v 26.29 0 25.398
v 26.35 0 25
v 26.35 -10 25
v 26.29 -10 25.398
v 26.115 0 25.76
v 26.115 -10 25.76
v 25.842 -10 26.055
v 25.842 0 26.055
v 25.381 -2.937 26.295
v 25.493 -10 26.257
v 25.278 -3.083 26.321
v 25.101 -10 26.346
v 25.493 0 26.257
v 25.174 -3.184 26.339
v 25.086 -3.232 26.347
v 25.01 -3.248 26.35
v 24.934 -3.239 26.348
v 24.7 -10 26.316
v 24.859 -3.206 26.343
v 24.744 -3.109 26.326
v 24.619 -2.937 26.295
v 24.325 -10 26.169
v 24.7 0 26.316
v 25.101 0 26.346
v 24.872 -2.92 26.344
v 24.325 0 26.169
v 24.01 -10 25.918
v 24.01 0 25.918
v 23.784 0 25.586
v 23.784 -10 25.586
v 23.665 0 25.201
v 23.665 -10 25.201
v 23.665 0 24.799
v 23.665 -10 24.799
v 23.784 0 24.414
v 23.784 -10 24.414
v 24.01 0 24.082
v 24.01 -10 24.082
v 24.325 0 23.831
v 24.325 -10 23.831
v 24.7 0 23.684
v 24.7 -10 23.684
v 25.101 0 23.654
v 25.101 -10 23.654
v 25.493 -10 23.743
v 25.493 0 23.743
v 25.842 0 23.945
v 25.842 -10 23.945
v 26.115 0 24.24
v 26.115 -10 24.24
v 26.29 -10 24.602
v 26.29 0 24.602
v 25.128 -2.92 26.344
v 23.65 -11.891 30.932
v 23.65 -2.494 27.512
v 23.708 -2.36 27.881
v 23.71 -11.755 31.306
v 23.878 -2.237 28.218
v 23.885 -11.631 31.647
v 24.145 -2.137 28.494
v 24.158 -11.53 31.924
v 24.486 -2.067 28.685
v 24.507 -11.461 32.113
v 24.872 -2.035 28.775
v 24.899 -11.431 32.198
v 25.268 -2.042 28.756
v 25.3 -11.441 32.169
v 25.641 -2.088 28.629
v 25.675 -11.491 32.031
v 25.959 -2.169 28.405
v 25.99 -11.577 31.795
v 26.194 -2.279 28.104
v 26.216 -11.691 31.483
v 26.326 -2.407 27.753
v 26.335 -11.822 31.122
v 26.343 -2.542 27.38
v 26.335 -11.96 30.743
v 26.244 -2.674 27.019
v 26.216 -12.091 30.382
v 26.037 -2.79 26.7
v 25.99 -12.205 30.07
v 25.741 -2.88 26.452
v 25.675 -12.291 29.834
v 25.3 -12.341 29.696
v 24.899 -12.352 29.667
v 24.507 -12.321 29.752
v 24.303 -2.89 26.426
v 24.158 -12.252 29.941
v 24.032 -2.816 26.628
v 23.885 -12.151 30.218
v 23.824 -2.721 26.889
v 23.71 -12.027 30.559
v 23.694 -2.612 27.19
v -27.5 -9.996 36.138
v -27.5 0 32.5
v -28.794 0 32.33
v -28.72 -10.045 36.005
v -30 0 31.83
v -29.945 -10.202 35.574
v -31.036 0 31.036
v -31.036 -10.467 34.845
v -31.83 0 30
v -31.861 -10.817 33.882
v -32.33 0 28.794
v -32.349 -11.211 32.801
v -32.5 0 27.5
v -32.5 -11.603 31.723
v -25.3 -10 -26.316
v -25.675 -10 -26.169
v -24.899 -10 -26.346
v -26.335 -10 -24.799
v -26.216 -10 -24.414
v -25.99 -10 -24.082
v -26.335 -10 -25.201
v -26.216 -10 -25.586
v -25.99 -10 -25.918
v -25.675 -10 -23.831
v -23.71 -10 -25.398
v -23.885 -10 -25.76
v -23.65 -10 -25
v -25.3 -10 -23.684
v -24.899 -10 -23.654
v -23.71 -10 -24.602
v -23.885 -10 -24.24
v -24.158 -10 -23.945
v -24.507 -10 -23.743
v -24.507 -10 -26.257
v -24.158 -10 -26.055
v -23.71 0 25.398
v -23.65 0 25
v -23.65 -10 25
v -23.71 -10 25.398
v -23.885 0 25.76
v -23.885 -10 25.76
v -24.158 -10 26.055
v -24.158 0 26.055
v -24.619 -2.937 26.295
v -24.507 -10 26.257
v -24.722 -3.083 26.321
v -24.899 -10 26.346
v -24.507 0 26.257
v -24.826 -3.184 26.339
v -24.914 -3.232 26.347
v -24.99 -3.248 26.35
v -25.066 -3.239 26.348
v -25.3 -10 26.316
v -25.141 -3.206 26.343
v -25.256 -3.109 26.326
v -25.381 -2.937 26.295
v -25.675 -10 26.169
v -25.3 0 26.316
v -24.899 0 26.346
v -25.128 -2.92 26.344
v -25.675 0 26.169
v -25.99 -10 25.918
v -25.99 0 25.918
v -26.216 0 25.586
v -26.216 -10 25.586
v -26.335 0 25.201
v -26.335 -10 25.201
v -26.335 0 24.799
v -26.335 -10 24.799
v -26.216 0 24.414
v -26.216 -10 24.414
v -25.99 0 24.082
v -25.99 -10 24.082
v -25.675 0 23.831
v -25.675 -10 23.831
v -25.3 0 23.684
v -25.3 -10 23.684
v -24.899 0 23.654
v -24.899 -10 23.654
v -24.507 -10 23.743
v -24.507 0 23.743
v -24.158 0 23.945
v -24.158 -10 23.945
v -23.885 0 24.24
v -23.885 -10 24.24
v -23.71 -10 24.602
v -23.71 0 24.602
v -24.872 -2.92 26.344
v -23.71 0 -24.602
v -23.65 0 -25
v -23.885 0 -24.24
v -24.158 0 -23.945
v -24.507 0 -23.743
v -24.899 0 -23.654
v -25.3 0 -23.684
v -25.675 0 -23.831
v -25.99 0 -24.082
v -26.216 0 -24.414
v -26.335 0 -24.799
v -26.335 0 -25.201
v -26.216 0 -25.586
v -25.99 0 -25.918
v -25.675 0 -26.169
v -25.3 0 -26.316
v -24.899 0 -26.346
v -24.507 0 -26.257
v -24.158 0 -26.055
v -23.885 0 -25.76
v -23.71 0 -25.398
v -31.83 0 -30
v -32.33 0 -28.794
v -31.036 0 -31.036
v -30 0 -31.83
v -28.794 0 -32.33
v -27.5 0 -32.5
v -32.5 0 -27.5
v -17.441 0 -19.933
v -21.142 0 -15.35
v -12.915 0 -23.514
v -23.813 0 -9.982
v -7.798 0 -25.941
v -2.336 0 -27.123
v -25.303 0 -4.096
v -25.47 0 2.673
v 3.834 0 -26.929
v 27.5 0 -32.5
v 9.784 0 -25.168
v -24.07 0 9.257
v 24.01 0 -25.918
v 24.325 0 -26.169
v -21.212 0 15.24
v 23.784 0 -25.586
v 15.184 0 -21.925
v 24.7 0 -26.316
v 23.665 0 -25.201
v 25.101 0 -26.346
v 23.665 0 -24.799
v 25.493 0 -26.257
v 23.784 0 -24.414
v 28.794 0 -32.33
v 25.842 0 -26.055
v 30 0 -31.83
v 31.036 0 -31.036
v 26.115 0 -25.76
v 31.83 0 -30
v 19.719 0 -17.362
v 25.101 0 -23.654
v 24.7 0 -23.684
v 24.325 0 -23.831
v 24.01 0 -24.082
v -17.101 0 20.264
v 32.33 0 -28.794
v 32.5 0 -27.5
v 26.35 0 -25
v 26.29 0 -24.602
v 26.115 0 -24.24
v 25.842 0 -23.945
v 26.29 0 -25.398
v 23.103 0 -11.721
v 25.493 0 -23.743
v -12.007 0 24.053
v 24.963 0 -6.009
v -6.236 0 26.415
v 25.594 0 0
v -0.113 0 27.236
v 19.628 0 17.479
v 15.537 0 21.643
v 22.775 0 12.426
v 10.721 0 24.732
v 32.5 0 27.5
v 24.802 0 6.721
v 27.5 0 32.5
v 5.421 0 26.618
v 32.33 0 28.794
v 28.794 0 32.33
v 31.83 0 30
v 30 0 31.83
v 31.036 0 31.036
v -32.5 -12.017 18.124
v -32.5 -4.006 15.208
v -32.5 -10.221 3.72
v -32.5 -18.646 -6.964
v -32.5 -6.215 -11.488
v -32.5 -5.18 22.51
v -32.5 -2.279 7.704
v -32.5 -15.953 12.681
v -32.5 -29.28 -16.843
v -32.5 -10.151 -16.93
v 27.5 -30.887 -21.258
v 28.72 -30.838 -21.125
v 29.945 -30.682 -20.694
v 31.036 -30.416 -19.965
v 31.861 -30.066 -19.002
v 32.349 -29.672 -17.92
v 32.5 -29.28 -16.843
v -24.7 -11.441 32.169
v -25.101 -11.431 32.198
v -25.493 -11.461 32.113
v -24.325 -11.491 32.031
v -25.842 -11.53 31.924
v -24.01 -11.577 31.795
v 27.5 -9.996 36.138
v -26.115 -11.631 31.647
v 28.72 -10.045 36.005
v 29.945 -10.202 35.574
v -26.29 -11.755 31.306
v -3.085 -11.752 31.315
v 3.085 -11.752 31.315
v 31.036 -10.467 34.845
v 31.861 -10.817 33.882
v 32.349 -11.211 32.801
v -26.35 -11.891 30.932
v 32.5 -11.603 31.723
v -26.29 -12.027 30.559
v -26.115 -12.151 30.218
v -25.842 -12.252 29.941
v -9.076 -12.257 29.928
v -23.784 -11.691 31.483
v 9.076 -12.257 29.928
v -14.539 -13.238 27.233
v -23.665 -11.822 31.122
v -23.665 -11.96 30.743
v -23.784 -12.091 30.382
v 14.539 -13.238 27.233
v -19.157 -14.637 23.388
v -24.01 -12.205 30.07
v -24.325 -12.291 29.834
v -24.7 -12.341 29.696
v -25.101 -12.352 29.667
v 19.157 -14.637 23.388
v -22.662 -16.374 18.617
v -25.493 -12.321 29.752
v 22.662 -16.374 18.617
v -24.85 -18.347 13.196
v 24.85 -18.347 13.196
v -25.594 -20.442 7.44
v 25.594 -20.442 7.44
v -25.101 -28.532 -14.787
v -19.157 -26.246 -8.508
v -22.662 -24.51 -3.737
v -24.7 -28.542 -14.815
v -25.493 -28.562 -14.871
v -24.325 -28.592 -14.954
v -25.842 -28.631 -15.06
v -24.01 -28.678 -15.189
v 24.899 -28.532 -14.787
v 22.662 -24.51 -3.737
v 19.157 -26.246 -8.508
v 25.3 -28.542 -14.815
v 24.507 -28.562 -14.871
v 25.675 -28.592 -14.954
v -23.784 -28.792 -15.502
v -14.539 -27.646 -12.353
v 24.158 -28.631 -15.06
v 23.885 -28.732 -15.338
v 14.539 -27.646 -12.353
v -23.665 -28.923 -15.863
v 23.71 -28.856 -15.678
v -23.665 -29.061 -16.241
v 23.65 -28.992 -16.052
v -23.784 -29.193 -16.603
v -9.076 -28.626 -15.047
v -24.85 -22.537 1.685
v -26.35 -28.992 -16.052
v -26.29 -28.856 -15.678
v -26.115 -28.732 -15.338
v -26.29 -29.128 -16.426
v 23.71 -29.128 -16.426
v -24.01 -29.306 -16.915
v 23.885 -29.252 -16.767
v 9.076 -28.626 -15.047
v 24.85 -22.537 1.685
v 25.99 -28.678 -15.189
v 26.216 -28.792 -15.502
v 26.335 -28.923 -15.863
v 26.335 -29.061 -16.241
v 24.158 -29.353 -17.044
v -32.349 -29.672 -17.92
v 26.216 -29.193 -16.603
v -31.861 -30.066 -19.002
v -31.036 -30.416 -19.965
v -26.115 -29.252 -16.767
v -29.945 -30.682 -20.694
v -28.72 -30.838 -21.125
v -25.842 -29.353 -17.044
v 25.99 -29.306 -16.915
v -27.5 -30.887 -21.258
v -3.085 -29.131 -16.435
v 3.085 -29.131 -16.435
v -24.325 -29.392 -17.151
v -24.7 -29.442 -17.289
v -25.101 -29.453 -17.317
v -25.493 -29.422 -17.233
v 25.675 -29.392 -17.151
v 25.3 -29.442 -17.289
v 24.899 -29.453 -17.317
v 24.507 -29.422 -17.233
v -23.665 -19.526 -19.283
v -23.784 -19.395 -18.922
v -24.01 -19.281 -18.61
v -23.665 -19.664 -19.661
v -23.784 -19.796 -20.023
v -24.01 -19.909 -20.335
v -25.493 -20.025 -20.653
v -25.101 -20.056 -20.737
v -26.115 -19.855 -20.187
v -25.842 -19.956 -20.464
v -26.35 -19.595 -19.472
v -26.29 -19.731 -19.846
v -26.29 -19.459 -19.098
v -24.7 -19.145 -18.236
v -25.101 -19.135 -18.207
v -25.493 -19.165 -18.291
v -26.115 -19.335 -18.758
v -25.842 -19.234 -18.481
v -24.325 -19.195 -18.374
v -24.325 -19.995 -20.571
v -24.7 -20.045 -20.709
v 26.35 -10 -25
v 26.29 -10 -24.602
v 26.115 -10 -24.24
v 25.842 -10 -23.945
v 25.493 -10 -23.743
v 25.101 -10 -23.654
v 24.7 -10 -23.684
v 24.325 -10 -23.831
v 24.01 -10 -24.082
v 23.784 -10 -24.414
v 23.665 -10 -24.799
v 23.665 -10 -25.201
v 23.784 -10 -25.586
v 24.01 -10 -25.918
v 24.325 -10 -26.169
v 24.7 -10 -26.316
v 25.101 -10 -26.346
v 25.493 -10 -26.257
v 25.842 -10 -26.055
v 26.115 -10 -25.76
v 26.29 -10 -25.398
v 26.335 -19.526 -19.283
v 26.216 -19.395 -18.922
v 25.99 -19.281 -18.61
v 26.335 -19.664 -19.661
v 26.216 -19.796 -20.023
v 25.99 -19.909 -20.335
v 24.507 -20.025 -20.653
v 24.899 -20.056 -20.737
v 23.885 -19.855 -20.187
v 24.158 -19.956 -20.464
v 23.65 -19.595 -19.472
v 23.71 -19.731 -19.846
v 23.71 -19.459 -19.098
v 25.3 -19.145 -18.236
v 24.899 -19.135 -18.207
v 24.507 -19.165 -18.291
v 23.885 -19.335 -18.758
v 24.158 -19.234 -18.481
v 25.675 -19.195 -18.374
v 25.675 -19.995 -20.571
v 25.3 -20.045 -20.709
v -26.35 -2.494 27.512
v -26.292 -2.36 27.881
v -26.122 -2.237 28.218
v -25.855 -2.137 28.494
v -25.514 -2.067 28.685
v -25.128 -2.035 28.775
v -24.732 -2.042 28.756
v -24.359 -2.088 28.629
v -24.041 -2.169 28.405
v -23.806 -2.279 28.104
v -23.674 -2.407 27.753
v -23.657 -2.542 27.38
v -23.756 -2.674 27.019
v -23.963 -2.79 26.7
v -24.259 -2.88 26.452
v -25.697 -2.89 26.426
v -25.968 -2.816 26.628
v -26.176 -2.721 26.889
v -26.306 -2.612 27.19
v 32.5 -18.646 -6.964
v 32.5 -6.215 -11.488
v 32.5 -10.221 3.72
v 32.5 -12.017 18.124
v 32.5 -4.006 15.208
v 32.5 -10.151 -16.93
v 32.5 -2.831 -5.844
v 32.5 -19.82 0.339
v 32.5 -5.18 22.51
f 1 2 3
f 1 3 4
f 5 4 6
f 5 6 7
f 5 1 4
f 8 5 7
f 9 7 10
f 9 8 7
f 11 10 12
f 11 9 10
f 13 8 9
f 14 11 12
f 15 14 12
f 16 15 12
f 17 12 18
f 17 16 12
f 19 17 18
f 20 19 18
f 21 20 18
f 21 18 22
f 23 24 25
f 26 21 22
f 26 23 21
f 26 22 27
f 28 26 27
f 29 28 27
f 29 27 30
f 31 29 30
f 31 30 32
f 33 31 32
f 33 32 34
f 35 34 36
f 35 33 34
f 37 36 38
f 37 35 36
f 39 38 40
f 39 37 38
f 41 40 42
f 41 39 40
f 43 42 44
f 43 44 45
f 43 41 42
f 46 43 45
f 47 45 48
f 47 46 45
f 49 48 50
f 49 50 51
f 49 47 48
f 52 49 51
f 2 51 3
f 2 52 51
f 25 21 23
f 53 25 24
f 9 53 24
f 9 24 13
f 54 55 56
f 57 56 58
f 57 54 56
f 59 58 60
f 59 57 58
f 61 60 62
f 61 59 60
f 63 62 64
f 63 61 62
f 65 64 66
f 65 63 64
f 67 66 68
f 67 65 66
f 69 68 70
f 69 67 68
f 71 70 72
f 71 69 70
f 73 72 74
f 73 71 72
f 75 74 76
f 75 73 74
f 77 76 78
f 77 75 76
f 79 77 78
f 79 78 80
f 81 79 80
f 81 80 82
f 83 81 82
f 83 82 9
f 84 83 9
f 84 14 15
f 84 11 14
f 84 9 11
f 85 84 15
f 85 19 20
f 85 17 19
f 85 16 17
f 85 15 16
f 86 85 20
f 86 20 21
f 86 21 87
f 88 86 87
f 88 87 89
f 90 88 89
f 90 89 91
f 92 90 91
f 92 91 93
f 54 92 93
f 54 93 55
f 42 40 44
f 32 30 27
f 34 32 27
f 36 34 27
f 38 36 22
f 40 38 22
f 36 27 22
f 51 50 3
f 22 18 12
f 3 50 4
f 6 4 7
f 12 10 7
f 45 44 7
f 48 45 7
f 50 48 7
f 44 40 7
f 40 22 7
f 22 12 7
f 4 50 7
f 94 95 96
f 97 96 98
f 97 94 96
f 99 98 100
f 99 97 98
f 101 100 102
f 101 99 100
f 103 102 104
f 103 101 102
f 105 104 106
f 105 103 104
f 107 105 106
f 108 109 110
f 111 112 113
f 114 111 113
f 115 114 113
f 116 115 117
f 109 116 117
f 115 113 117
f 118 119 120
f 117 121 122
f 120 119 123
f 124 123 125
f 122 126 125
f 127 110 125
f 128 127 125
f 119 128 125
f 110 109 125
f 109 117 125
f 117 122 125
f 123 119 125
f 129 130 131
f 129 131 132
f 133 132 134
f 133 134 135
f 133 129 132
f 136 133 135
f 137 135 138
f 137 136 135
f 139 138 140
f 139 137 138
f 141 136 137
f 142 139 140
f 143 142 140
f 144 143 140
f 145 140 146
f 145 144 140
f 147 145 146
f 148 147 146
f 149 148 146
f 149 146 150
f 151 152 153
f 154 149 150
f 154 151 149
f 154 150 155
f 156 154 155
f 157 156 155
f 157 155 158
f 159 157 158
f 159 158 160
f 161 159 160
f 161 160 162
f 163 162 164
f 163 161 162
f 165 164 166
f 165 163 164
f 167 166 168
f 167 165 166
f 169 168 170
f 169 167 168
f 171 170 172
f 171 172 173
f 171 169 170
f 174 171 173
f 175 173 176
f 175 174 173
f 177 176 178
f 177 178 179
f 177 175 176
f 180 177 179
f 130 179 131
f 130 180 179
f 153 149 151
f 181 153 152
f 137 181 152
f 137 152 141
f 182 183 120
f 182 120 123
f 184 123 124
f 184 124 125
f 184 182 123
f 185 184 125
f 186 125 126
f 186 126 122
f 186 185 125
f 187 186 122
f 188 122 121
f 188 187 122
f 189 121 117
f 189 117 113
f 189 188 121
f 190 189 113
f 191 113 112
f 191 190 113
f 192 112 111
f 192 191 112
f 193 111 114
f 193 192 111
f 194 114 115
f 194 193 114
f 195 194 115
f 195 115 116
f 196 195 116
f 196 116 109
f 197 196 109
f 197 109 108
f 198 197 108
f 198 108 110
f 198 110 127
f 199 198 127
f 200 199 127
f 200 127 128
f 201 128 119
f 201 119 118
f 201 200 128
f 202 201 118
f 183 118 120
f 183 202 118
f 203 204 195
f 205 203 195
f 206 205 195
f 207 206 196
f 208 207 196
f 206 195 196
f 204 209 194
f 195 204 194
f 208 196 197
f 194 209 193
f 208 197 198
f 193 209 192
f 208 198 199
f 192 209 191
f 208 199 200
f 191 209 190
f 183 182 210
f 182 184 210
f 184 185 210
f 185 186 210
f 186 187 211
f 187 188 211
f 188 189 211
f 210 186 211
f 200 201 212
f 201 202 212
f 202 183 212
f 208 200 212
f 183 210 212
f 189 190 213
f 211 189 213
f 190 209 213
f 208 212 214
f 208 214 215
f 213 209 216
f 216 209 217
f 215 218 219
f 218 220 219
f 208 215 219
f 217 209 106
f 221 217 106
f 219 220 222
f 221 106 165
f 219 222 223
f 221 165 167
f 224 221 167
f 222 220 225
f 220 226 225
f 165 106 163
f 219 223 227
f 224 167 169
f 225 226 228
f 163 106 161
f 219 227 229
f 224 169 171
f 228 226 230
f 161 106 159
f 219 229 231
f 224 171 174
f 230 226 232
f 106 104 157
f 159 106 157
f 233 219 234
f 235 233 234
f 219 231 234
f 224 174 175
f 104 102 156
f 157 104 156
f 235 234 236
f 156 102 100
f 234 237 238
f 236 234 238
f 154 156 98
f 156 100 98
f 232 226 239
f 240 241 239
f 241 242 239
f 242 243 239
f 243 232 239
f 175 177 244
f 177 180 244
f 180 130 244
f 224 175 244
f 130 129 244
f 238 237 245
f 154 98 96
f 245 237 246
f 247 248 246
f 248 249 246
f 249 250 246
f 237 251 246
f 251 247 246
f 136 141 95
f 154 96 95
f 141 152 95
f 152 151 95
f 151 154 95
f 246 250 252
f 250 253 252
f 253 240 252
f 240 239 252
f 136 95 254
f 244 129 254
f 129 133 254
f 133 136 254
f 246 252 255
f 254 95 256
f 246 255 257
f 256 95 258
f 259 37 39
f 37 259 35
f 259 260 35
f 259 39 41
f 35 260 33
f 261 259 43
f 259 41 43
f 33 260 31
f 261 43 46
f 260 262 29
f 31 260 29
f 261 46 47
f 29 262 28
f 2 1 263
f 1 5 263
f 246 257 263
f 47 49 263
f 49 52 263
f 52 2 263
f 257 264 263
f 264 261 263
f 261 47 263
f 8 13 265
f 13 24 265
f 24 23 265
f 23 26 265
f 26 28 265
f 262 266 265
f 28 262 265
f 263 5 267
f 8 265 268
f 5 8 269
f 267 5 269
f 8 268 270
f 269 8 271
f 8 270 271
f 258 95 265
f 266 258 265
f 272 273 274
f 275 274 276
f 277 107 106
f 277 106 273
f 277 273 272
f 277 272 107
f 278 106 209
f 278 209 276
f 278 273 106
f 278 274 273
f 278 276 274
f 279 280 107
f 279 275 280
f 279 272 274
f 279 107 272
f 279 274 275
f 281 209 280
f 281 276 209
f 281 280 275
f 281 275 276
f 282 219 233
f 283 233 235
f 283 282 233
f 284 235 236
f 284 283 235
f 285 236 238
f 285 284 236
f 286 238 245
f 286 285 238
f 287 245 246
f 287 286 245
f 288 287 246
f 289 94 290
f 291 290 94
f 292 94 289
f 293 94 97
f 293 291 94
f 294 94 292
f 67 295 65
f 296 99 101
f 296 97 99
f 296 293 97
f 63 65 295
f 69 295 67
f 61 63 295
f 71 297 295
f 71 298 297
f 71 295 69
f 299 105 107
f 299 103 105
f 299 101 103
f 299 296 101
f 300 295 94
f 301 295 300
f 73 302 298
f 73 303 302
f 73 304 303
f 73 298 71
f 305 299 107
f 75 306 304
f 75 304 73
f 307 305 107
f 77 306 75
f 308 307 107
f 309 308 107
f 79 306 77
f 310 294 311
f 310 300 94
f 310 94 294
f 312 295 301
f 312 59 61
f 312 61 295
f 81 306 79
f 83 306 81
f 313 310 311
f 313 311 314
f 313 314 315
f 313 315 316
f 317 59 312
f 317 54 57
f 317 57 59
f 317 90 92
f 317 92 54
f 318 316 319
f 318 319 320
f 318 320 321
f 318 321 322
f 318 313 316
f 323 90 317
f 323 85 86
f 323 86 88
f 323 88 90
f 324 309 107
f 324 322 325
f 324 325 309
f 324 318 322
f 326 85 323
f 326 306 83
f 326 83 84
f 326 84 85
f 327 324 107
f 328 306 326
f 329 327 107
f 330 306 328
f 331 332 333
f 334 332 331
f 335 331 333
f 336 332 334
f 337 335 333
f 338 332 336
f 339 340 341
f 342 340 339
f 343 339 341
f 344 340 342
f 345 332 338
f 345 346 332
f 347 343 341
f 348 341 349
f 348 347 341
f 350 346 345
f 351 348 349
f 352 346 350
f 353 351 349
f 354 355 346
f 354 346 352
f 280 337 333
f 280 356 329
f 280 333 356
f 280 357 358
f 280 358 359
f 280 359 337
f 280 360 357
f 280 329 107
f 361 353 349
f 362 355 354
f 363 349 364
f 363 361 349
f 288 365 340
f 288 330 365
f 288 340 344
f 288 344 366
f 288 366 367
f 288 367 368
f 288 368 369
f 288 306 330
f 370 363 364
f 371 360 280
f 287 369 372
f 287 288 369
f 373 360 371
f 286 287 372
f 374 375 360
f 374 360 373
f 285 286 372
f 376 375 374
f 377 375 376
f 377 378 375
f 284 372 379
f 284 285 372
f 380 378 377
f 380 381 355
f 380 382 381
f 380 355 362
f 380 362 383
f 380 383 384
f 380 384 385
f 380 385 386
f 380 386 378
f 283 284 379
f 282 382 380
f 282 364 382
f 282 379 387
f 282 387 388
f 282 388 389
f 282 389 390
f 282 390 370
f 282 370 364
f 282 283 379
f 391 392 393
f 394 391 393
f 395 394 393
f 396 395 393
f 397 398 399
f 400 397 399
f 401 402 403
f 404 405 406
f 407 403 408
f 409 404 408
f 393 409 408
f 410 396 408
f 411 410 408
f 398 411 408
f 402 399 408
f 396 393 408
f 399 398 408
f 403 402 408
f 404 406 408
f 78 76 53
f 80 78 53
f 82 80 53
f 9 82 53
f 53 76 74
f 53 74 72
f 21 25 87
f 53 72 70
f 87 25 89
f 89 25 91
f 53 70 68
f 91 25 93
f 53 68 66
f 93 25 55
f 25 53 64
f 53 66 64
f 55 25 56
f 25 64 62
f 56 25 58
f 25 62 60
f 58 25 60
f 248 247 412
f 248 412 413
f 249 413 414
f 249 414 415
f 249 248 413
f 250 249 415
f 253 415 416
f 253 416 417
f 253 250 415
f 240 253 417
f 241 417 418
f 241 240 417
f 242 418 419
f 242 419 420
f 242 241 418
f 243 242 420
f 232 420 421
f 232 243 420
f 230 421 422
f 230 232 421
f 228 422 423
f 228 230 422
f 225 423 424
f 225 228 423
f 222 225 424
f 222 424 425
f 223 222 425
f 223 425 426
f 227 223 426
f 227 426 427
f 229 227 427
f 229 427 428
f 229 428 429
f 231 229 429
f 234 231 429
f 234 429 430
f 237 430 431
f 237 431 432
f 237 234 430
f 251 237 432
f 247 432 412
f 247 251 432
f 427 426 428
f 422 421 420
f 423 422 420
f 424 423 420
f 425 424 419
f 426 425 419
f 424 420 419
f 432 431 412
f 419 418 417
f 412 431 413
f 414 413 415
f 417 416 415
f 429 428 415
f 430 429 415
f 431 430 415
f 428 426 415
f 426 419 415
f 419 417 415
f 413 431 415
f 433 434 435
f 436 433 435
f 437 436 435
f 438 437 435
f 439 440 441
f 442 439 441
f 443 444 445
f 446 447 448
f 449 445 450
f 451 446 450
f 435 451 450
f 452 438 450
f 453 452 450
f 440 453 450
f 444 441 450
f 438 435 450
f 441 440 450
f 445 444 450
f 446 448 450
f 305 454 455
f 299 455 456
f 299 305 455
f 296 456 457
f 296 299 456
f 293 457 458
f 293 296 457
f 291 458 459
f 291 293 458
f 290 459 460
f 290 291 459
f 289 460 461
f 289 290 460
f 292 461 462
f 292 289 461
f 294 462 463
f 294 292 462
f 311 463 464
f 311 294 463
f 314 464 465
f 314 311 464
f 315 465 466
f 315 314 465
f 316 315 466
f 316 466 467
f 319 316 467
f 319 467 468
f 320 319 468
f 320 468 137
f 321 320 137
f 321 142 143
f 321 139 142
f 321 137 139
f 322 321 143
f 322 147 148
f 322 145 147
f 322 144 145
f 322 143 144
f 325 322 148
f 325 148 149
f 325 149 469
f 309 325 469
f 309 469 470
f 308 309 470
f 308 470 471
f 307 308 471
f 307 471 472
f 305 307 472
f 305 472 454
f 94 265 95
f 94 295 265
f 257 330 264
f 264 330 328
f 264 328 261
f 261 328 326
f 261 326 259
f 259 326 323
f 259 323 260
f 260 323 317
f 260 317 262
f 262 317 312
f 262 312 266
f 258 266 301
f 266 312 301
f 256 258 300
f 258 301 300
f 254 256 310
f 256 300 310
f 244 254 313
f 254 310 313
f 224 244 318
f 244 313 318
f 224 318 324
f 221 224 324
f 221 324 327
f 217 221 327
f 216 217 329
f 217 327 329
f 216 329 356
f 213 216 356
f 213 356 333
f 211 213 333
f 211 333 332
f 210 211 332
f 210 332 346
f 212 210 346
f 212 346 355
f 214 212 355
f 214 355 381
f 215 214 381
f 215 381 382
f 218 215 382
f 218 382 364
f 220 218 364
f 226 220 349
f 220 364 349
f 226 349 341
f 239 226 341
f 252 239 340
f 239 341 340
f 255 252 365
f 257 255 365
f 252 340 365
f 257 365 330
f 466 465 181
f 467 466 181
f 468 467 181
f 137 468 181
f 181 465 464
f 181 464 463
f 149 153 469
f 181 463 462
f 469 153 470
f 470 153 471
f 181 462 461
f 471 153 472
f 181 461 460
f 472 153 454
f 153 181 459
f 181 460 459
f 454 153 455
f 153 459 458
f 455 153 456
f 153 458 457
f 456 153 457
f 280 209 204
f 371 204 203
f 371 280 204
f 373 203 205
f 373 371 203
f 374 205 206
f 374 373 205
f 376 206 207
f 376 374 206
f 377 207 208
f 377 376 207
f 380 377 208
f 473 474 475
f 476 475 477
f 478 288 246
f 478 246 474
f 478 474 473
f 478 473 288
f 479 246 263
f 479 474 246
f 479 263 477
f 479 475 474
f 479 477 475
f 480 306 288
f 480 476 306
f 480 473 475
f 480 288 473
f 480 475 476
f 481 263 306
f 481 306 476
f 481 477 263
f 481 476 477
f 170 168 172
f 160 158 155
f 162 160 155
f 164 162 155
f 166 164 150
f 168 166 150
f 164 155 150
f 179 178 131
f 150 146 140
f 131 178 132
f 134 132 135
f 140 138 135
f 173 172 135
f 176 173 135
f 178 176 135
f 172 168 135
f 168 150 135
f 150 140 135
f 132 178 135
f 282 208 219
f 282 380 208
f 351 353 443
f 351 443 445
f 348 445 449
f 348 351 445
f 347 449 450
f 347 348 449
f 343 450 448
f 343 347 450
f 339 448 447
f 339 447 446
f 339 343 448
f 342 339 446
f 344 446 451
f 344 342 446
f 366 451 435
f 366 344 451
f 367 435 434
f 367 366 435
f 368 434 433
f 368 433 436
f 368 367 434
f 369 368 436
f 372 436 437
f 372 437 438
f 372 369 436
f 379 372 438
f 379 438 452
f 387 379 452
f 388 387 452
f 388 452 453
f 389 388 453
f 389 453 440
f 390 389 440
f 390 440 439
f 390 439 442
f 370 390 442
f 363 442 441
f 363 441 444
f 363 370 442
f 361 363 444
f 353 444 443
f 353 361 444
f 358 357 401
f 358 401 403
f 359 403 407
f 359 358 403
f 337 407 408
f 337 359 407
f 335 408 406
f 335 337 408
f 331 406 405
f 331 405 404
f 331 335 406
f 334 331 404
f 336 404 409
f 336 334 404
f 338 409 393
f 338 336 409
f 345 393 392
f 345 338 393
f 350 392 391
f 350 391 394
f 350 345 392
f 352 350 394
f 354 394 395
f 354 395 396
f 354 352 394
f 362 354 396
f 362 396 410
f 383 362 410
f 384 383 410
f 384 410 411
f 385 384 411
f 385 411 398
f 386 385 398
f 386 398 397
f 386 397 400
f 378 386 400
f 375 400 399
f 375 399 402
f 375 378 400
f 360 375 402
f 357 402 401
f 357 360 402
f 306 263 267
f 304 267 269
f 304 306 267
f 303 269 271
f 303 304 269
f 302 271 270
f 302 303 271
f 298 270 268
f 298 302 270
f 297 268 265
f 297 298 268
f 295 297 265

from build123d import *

# Parameters (mm, degrees)
F1_R      = 1.35
F7_DEPTH  = 10
F6_R      = 1.35
F8_DEPTH  = 10
F9_R      = 25.5937233364
F10_DEPTH = 32.8702228284


with BuildPart() as f5:
    # F0 (on Front) → F5 section 0
    with BuildSketch(Plane.XZ):
        with BuildLine():
            ThreePointArc((32.5, 27.5), (31.0355339059, 31.0355339059), (27.5, 32.5))
            Line((27.5, 32.5), (-27.5, 32.5))
            ThreePointArc((-27.5, 32.5), (-31.0355339059, 31.0355339059), (-32.5, 27.5))
            Line((-32.5, 27.5), (-32.5, -27.5))
            ThreePointArc((-32.5, -27.5), (-31.0355339059, -31.0355339059), (-27.5, -32.5))
            Line((-27.5, -32.5), (27.5, -32.5))
            ThreePointArc((27.5, -32.5), (31.0355339059, -31.0355339059), (32.5, -27.5))
            Line((32.5, -27.5), (32.5, 27.5))
        make_face()
    # F4 (on line) → F5 section 1
    with BuildSketch(Plane(origin=(0, -20.4416673649, 7.4401584596), x_dir=(-1, 0, 0), z_dir=(0, 0.9396926208, -0.3420201433))):
        with BuildLine():
            Line((27.5, 30.5400101755), (-27.5, 30.5400101755))
            add(Edge.make_bspline(
                [(-27.5, 30.5400101755), (-32.5, 30.5400101755), (-32.5, 25.8415470716)],
                knots=[4.7123889804, 4.7123889804, 4.7123889804, 6.2831853072, 6.2831853072, 6.2831853072], degree=2, weights=[1, 0.7071067812, 1]))
            Line((-32.5, 25.8415470716), (-32.5, -25.8415470716))
            add(Edge.make_bspline(
                [(-32.5, -25.8415470716), (-32.5, -30.5400101755), (-27.5, -30.5400101755)],
                knots=[0, 0, 0, 1.5707963268, 1.5707963268, 1.5707963268], degree=2, weights=[1, 0.7071067812, 1]))
            Line((-27.5, -30.5400101755), (27.5, -30.5400101755))
            add(Edge.make_bspline(
                [(27.5, -30.5400101755), (32.5, -30.5400101755), (32.5, -25.8415470716)],
                knots=[1.5707963268, 1.5707963268, 1.5707963268, 3.1415926536, 3.1415926536, 3.1415926536], degree=2, weights=[1, 0.7071067812, 1]))
            Line((32.5, -25.8415470716), (32.5, 25.8415470716))
            add(Edge.make_bspline(
                [(32.5, 25.8415470716), (32.5, 30.5400101755), (27.5, 30.5400101755)],
                knots=[3.1415926536, 3.1415926536, 3.1415926536, 4.7123889804, 4.7123889804, 4.7123889804], degree=2, weights=[1, 0.7071067812, 1]))
        make_face()
    loft()

    # F1 (on Front) → F7 (cut)
    with BuildSketch(Plane.XZ):
        with Locations((-25, 25)):
            Circle(F1_R)
        with Locations((25, 25)):
            Circle(F1_R)
        with Locations((-25, -25)):
            Circle(F1_R)
        with Locations((25, -25)):
            Circle(F1_R)
    extrude(amount=F7_DEPTH, mode=Mode.SUBTRACT)

    # F6 (on line) → F8 (cut)
    with BuildSketch(Plane(origin=(0, -20.4416673649, 7.4401584596), x_dir=(-1, 0, 0), z_dir=(0, 0.9396926208, -0.3420201433))):
        with Locations((-25, 25)):
            Circle(F6_R)
        with Locations((25, 25)):
            Circle(F6_R)
        with Locations((-25, -25)):
            Circle(F6_R)
        with Locations((25, -25)):
            Circle(F6_R)
    extrude(amount=F8_DEPTH, mode=Mode.SUBTRACT)

    # F9 (on face) → F10 (cut, through all)
    with BuildSketch(Plane(origin=(0, -20.4416673649, 7.4401584596), x_dir=(1, 0, 0), z_dir=(0, -0.9396926208, 0.3420201433))):
        Circle(F9_R)
    extrude(amount=-F10_DEPTH, mode=Mode.SUBTRACT)


solid = f5.part
